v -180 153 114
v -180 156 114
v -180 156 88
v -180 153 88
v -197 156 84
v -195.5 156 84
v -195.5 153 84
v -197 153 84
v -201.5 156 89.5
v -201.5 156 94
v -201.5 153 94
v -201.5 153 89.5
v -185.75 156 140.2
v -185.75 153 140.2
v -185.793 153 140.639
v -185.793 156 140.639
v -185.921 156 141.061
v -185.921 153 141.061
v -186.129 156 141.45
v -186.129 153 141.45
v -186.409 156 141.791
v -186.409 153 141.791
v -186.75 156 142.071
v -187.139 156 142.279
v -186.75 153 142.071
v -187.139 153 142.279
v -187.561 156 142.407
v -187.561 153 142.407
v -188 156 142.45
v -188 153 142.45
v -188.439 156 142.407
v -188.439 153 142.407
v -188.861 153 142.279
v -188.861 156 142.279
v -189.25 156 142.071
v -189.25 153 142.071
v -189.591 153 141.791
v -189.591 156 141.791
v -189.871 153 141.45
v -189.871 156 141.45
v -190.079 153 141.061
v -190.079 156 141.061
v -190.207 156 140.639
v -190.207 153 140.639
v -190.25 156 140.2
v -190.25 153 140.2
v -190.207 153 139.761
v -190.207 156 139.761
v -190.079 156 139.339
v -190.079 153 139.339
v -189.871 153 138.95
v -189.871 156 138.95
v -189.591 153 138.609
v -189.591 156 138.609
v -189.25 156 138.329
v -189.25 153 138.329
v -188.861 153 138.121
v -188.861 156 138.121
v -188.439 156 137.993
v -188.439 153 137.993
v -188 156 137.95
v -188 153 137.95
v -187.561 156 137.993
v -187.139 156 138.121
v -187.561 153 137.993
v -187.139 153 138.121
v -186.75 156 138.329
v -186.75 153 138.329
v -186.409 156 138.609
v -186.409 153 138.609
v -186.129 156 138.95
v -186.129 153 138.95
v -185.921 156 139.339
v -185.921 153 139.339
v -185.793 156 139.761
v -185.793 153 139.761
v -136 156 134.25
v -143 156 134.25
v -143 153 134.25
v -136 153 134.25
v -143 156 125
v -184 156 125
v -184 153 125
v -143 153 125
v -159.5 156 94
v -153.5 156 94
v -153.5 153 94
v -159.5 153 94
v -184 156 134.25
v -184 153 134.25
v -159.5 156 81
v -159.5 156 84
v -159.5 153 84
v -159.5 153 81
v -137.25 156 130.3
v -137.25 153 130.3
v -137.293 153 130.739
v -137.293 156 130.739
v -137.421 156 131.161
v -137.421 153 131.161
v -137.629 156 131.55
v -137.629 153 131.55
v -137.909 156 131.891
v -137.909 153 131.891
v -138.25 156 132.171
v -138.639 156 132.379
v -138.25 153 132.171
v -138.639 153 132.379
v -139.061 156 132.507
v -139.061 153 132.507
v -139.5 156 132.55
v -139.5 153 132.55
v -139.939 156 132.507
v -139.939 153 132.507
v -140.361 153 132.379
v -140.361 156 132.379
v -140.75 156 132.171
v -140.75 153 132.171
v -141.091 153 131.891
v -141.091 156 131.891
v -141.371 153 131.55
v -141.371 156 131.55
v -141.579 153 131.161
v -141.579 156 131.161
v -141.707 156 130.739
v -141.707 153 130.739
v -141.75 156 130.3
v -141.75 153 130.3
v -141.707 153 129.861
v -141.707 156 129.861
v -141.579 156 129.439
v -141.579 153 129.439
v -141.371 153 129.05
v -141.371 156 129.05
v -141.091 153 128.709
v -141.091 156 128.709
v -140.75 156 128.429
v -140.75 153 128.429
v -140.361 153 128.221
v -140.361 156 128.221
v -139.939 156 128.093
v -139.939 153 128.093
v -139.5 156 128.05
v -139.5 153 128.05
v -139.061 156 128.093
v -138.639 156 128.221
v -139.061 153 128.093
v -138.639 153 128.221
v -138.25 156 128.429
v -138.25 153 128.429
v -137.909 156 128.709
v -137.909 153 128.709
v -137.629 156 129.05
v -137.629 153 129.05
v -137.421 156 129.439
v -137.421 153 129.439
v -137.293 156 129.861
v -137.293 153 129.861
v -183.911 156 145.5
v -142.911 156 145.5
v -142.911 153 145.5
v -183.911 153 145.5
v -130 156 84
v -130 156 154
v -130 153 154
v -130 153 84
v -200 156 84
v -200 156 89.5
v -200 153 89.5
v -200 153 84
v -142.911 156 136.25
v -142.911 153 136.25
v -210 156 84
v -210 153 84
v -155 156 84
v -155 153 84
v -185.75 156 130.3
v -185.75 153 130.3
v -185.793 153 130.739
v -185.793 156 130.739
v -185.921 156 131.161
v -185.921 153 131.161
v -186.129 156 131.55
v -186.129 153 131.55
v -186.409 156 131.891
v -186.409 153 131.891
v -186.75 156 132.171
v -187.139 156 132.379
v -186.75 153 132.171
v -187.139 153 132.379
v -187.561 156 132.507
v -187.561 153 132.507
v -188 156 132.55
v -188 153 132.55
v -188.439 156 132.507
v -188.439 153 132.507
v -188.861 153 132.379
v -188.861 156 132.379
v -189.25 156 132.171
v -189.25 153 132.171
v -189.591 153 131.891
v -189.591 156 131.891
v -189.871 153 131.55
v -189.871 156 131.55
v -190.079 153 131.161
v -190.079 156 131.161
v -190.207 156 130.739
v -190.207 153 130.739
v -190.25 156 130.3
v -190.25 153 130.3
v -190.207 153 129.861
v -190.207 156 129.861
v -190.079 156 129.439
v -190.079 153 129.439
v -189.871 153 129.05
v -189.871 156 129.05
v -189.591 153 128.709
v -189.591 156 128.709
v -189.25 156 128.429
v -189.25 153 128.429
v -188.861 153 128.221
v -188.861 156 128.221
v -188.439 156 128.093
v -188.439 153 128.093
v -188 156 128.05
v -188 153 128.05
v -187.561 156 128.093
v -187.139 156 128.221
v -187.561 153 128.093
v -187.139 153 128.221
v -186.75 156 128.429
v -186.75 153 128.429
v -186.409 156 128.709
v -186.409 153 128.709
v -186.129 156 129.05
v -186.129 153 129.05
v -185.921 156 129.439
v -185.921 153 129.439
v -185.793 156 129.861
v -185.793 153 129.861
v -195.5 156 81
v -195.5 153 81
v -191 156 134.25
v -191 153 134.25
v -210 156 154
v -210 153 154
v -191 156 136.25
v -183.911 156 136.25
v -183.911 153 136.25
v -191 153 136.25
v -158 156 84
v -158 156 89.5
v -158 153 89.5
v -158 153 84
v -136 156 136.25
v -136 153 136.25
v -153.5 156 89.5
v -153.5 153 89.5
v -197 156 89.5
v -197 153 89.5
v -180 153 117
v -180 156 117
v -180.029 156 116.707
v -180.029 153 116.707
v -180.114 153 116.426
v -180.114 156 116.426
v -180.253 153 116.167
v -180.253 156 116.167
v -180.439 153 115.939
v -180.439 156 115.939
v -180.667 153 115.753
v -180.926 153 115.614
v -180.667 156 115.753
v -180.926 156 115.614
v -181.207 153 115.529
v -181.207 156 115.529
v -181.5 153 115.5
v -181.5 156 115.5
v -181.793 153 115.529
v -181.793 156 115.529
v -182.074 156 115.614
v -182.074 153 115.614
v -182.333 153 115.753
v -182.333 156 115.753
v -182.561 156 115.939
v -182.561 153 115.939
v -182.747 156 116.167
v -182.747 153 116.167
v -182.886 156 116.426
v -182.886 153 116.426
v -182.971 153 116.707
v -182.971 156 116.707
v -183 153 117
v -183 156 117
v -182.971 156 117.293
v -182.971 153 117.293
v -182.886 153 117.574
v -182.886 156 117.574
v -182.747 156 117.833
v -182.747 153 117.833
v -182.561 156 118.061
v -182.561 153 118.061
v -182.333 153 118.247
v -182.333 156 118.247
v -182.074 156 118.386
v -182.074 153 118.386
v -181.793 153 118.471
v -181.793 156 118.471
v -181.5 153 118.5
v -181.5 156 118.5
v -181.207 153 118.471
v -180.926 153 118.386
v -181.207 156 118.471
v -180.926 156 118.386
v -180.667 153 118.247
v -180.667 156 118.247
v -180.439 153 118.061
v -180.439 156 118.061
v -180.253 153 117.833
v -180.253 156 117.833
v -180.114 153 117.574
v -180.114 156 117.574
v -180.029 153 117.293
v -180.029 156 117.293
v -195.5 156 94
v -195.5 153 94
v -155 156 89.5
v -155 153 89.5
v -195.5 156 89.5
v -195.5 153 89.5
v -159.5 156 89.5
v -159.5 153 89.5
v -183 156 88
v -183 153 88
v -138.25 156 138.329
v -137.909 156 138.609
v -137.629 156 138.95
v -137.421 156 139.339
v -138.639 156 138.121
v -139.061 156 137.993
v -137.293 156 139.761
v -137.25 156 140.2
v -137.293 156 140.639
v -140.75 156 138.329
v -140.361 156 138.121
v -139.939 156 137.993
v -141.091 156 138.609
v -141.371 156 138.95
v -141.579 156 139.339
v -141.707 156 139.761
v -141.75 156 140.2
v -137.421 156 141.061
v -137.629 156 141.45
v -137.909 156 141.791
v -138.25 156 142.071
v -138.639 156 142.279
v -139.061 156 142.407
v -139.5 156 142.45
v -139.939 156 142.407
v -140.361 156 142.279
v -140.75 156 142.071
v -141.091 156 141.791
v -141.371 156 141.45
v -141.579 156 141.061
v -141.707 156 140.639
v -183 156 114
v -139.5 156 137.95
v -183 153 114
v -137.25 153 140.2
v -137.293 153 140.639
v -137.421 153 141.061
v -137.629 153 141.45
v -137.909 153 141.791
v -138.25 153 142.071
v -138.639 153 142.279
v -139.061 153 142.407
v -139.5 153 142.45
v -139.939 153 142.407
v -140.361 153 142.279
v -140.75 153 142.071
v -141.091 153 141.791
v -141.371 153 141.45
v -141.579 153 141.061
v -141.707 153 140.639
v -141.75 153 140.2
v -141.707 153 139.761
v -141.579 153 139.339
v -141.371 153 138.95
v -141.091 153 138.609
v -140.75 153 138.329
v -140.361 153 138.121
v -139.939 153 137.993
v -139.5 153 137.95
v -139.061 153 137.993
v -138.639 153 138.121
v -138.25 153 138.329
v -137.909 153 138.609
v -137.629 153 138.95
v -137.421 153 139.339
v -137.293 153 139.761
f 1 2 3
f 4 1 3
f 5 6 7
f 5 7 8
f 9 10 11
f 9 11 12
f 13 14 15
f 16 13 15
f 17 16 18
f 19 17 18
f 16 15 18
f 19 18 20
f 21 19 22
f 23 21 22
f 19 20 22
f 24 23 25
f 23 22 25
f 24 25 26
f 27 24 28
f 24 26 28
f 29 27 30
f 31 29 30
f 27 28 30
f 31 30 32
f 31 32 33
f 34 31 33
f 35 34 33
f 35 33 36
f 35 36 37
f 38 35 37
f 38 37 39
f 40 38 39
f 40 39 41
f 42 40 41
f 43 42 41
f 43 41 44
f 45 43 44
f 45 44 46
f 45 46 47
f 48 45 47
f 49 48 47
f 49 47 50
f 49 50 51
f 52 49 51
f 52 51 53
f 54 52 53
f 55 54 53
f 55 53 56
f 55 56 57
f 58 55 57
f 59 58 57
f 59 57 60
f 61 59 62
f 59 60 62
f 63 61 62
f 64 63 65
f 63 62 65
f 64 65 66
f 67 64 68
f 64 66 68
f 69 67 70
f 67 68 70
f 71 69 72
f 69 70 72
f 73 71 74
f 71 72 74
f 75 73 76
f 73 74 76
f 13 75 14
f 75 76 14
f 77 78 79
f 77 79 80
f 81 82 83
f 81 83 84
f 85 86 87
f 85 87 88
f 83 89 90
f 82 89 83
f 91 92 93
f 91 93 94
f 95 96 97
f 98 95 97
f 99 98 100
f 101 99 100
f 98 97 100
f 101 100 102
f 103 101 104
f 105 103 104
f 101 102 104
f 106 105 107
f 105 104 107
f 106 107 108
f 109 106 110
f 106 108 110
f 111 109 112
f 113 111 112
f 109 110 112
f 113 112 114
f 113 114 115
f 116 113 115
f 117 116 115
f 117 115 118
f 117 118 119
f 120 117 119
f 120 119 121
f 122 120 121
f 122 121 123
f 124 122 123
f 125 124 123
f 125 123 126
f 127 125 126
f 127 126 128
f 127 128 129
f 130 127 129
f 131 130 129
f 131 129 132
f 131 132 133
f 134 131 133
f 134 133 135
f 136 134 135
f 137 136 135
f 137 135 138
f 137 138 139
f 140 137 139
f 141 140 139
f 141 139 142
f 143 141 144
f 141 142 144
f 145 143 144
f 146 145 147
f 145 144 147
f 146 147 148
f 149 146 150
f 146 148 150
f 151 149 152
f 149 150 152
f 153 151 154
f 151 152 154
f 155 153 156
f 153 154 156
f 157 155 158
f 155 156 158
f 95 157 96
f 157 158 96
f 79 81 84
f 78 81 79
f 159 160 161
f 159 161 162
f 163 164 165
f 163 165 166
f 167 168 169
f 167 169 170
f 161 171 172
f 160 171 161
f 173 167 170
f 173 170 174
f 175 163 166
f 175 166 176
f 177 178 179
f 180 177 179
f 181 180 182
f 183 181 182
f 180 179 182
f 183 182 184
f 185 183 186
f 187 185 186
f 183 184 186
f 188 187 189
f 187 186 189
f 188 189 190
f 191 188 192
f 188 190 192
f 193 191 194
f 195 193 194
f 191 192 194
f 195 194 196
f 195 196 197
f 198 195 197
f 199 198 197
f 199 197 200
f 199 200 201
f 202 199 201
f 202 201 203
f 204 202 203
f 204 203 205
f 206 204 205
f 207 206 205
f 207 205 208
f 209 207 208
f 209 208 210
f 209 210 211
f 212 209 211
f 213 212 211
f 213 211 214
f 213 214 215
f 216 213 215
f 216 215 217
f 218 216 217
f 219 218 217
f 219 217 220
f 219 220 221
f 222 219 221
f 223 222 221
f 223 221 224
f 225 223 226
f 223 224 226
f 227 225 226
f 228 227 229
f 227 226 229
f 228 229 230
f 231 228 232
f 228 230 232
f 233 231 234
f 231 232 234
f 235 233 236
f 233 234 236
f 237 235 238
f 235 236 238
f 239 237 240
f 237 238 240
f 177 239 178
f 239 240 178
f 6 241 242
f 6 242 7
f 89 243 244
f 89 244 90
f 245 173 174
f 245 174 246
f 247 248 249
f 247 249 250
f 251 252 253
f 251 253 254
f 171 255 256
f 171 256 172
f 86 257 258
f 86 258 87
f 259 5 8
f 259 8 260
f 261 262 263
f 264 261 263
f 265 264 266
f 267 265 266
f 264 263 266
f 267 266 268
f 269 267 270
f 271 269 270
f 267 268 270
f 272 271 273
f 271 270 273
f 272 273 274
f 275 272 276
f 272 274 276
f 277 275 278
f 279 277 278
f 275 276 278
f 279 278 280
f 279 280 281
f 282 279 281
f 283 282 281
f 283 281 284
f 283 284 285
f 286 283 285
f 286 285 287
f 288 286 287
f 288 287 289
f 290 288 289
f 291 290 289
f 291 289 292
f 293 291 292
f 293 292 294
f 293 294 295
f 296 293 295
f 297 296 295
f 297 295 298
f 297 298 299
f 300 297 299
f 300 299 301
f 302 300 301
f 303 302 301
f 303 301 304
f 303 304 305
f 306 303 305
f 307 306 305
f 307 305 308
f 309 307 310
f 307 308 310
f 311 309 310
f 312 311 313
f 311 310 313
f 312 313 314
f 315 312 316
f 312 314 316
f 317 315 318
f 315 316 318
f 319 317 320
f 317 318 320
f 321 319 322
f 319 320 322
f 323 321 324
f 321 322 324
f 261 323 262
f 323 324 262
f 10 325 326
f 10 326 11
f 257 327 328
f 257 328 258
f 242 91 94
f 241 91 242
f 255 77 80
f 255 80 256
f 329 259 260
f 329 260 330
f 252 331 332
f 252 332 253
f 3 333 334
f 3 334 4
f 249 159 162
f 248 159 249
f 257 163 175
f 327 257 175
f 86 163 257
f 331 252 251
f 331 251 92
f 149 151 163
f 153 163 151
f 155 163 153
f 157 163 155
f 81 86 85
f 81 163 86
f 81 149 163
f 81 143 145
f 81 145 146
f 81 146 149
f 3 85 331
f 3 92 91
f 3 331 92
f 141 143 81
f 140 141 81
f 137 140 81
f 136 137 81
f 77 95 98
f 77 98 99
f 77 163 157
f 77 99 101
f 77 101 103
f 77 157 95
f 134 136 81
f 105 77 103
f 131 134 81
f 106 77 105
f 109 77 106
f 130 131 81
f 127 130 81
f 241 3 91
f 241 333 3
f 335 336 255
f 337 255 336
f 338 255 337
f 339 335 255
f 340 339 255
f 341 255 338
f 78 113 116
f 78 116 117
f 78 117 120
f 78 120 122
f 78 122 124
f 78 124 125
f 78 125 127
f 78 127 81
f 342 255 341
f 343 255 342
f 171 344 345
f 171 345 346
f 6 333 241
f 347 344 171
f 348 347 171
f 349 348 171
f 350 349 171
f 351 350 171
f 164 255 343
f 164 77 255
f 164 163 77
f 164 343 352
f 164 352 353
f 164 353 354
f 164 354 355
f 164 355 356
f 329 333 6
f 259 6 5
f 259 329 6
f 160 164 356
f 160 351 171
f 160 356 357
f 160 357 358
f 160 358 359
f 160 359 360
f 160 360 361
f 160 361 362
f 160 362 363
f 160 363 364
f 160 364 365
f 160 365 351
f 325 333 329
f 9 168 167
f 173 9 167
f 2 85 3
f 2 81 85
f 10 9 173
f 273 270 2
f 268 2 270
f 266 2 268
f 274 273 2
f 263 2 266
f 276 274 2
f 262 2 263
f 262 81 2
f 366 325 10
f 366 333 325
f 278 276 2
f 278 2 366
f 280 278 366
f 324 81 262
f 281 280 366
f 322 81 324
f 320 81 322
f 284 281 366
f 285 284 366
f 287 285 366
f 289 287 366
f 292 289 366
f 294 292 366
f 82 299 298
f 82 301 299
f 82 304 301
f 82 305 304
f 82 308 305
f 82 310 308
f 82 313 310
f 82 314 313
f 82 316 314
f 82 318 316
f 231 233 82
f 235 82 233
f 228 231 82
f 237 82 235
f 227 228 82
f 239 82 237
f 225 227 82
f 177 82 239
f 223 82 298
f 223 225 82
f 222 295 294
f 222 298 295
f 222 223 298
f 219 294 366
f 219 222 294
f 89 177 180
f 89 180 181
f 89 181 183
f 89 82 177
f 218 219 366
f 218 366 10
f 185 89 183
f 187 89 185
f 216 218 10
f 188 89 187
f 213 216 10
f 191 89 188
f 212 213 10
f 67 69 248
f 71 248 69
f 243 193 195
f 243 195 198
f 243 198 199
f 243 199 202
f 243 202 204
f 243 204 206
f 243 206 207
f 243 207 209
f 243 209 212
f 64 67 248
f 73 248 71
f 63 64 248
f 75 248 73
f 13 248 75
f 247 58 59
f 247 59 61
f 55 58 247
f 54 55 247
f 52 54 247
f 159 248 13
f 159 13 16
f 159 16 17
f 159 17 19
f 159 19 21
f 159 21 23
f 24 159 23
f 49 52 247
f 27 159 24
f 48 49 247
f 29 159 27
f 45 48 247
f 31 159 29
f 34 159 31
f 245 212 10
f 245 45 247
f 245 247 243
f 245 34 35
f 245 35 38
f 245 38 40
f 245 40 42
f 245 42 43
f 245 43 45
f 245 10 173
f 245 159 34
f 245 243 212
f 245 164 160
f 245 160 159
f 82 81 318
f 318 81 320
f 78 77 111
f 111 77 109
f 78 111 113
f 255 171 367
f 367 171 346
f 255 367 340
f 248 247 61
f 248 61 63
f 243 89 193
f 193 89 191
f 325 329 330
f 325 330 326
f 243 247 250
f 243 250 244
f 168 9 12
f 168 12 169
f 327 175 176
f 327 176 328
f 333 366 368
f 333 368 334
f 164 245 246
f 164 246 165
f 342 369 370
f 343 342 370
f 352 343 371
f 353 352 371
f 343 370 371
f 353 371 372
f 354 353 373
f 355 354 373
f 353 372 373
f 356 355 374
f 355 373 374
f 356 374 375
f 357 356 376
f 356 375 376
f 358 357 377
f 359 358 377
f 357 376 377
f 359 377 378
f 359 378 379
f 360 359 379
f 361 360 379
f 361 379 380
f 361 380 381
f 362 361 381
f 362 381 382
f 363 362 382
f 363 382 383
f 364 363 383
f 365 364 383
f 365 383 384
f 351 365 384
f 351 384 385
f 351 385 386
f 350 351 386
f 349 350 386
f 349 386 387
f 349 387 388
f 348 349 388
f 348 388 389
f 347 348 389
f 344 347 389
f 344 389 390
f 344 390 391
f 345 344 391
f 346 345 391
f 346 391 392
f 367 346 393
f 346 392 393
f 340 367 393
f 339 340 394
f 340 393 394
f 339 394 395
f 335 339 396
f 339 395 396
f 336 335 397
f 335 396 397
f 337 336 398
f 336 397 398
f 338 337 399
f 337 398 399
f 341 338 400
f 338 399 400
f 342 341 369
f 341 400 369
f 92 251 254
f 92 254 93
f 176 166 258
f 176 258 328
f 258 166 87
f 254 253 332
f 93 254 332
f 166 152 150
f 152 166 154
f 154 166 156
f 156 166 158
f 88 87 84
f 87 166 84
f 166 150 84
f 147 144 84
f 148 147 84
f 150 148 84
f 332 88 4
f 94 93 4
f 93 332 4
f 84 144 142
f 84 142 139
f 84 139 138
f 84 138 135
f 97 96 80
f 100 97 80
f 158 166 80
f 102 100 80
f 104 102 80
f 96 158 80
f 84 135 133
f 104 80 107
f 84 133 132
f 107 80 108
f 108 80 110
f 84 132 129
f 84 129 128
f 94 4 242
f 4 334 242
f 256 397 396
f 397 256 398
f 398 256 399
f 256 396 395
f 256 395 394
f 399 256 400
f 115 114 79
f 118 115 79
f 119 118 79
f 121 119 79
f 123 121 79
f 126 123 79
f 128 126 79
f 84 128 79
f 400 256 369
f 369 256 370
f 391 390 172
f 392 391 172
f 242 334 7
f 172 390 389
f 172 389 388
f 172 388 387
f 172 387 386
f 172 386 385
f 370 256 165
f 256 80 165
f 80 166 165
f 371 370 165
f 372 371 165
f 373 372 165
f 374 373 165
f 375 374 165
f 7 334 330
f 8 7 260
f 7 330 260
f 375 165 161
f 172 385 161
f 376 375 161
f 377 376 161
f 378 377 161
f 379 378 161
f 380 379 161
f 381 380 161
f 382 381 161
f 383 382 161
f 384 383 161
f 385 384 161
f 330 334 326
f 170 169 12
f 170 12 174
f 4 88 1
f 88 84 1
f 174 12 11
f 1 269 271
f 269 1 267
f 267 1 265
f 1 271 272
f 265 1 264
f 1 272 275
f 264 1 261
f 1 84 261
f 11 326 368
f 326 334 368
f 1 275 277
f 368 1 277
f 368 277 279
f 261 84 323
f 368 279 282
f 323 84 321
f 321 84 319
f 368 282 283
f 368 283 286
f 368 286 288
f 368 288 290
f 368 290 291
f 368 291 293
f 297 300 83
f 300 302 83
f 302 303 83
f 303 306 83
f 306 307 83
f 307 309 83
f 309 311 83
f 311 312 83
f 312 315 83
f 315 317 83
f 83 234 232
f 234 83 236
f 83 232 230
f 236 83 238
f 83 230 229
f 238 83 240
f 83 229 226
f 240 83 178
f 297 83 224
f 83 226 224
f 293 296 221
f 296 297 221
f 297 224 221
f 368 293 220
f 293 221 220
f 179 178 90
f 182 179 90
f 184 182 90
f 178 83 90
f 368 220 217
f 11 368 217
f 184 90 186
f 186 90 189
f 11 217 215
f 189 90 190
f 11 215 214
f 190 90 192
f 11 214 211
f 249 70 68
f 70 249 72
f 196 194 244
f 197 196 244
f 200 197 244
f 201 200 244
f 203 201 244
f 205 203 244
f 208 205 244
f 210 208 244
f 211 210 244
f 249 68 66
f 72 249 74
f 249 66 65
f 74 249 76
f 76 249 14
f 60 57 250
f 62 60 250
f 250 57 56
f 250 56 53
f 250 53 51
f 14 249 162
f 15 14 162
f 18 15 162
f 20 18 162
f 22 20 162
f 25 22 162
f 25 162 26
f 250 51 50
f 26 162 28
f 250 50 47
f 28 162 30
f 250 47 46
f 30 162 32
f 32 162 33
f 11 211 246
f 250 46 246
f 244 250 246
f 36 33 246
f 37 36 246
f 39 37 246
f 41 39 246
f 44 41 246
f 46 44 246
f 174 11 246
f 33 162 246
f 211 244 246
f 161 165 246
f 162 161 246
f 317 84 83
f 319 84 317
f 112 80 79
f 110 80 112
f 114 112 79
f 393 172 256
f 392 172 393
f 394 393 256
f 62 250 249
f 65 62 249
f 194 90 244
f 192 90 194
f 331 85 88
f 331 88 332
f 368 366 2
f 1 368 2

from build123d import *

# Parameters (mm, degrees)
PAD002_DEPTH    = 3
SKETCH008_R     = 1.5
SKETCH008_W     = 3
SKETCH008_H     = 26
POCKET001_DEPTH = 3.001
POCKET002_DEPTH = 3.001
SKETCH011_R     = 2.25
HOLE003_DEPTH   = 3.001


with BuildPart() as part:
    # Sketch005 → Pad002 (new body)
    with BuildSketch(Plane.XZ):
        Polygon((-30, 0), (-30, 70), (50, 70), (50, 0), (25, 0), (25, 5.5), (26.5, 5.5), (26.5, 10), (20.5, 10), (20.5, 5.5), (22, 5.5), (22, 0), (20.5, 0), (20.5, -3), (-15.5, -3), (-15.5, 0), (-17, 0), (-17, 5.5), (-15.5, 5.5), (-15.5, 10), (-21.5, 10), (-21.5, 5.5), (-20, 5.5), (-20, 0), align=None)
    extrude(amount=PAD002_DEPTH)

    # Sketch008 (on Face25 of Pad002) → Pocket001 (cut, through all)
    with BuildSketch(Plane(origin=(0, 0, 0), x_dir=(1, 0, 0), z_dir=(0, 1, 0))):
        with Locations((-1.5, -33)):
            Circle(SKETCH008_R)
        with Locations((-1.5, -17)):
            Rectangle(SKETCH008_W, SKETCH008_H)
    extrude(amount=-POCKET001_DEPTH, mode=Mode.SUBTRACT)

    # Sketch009 (on Face4 of Pocket001) → Pocket002 (cut, through all)
    with BuildSketch(Plane(origin=(0, 0, 0), x_dir=(1, 0, 0), z_dir=(0, 1, 0))):
        Polygon((-4, -41), (37, -41), (37, -50.25), (44, -50.25), (44, -52.25), (37.088989, -52.25), (37.088989, -61.5), (-3.911011, -61.5), (-3.911011, -52.25), (-11, -52.25), (-11, -50.25), (-4, -50.25), align=None)
    extrude(amount=-POCKET002_DEPTH, mode=Mode.SUBTRACT)

    # Sketch011 (on Face5 of Pocket002) → Hole003 (cut, through all)
    with BuildSketch(Plane.XZ.offset(3)):
        with Locations((-8, 56.2)):
            Circle(SKETCH011_R)
        with Locations((-8, 46.3)):
            Circle(SKETCH011_R)
        with Locations((40.5, 56.2)):
            Circle(SKETCH011_R)
        with Locations((40.5, 46.3)):
            Circle(SKETCH011_R)
    extrude(amount=-HOLE003_DEPTH, mode=Mode.SUBTRACT)


with BuildPart() as part_1:
    # Body002 placement: moved
    add(part.part.moved(Location((-180, 156, 84))))


solid = part_1.part
